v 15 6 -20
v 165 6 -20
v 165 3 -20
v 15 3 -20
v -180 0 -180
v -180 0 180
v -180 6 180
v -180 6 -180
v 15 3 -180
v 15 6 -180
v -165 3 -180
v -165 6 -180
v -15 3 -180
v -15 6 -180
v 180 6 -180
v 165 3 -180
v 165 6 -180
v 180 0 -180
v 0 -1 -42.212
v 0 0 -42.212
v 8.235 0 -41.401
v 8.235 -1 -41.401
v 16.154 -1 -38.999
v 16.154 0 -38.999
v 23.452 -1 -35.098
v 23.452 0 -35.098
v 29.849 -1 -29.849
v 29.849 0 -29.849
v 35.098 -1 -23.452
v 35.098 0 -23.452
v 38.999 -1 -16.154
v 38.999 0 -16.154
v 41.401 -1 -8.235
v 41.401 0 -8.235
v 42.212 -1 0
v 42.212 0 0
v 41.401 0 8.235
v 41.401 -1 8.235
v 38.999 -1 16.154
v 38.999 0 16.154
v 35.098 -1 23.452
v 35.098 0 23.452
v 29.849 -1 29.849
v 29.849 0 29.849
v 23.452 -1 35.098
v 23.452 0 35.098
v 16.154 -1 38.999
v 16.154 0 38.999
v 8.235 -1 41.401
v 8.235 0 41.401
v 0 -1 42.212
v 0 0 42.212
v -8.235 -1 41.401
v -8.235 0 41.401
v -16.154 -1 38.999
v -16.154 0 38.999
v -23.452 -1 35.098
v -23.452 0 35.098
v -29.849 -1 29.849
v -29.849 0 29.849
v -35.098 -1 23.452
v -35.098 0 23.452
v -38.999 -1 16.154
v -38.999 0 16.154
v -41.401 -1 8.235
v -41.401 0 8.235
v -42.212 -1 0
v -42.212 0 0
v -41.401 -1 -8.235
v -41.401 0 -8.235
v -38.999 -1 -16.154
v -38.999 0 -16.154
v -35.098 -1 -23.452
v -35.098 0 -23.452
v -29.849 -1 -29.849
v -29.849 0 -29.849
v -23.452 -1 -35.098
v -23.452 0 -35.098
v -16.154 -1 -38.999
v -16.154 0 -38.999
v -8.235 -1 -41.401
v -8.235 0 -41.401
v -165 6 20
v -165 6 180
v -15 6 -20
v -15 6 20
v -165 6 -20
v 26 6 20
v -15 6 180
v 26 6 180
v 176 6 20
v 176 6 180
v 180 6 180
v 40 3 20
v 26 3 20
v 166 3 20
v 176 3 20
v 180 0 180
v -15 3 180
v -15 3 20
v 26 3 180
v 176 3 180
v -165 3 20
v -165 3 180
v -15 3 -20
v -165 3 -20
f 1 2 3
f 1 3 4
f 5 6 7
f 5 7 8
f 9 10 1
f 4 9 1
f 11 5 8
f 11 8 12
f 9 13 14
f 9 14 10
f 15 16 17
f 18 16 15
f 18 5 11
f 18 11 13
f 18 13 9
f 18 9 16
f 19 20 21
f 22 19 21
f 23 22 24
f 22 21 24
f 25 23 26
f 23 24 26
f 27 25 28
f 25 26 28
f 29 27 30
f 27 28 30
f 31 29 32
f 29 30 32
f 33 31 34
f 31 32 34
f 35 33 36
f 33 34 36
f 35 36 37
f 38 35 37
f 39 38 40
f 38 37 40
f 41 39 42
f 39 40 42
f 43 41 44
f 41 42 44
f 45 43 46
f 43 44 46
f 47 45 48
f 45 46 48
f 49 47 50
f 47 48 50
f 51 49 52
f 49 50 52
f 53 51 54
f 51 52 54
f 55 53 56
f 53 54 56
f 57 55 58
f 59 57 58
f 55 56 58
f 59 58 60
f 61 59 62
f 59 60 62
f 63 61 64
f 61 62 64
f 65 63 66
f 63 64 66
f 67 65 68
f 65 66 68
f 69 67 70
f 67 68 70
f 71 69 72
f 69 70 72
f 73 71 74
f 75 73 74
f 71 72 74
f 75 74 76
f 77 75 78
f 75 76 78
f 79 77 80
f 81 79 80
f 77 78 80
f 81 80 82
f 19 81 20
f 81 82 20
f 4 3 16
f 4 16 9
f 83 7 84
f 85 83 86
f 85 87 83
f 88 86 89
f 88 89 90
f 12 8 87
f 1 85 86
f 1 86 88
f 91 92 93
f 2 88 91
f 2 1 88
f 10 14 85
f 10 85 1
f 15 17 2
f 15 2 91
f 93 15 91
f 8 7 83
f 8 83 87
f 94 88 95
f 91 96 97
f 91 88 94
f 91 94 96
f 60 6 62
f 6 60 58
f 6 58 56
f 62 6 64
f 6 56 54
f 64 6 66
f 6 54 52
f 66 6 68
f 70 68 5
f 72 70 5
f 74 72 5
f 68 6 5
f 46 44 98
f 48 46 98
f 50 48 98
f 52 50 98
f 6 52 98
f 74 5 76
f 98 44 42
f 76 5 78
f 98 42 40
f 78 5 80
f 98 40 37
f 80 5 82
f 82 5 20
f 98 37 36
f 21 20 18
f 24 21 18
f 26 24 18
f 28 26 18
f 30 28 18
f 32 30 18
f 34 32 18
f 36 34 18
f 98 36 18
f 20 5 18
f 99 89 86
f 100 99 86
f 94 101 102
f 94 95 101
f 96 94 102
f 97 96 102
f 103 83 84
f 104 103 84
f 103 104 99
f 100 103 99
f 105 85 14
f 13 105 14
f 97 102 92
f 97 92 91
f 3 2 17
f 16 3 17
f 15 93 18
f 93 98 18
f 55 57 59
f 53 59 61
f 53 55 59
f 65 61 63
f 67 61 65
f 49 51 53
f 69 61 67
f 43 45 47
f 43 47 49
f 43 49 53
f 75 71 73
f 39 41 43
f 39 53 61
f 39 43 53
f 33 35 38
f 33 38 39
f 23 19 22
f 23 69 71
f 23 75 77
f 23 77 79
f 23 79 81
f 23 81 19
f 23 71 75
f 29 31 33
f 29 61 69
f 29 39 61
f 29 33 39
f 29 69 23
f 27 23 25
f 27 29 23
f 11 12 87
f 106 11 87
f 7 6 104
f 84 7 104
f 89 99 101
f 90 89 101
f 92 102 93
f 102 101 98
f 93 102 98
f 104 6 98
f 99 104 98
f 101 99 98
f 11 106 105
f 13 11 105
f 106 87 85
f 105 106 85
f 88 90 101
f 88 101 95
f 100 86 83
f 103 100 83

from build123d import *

# Parameters (mm, degrees)
SKETCH_1_W          = 360
SKETCH_1_H          = 360
EXTRUDE_1_DEPTH     = 6
SKETCH_2_W          = 140
SKETCH_2_H          = 140
CUT_EXTRUDE_1_DEPTH = 3
SKETCH_7_W          = 140
SKETCH_7_H          = 169.149624319
CUT_EXTRUDE_2_DEPTH = 110
SKETCH_4_R          = 42.212172728
EXTRUDE_2_DEPTH     = 1
SKETCH_10_W         = 6
SKETCH_10_H         = 160
CUT_EXTRUDE_3_DEPTH = 3
SKETCH_11_W         = 6
SKETCH_11_H         = 160
EXTRUDE_3_DEPTH     = 3
SKETCH_12_W         = 14
SKETCH_12_H         = 160
CUT_EXTRUDE_4_DEPTH = 3
SKETCH_13_W         = 14
SKETCH_13_H         = 160
EXTRUDE_4_DEPTH     = 3
SKETCH_14_W         = 4
SKETCH_14_H         = 160
EXTRUDE_5_DEPTH     = 3
SKETCH_15_W         = 4
SKETCH_15_H         = 160
CUT_EXTRUDE_5_DEPTH = 3
CUT_EXTRUDE_6_DEPTH = 3
SKETCH_17_W         = 150
SKETCH_17_H         = 165.602098182
CUT_EXTRUDE_7_DEPTH = 3


with BuildPart() as part:
    # 草图1 → 凸台-拉伸1 (new body)
    with BuildSketch(Plane(origin=(0, 0, 0), x_dir=(1, 0, 0), z_dir=(0, 1, 0))):
        Rectangle(SKETCH_1_W, SKETCH_1_H)
    extrude(amount=EXTRUDE_1_DEPTH)

    # 草图2 → 切除-拉伸1 (cut)
    with BuildSketch(Plane(origin=(0, 6, 0), x_dir=(1, 0, 0), z_dir=(0, 1, 0))):
        with Locations((-90, -90)):
            Rectangle(SKETCH_2_W, SKETCH_2_H)
        with Locations((90, -90)):
            Rectangle(SKETCH_2_W, SKETCH_2_H)
        with Locations((90, 90)):
            Rectangle(SKETCH_2_W, SKETCH_2_H)
        with Locations((-90, 90)):
            Rectangle(SKETCH_2_W, SKETCH_2_H)
    extrude(amount=-CUT_EXTRUDE_1_DEPTH, mode=Mode.SUBTRACT)

    # 草图7 → 切除-拉伸2 (cut)
    with BuildSketch(Plane(origin=(0, 3, 0), x_dir=(1, 0, 0), z_dir=(0, 1, 0))):
        with Locations((90, -104.57481216)):
            Rectangle(SKETCH_7_W, SKETCH_7_H)
        with Locations((-90, -104.57481216)):
            Rectangle(SKETCH_7_W, SKETCH_7_H)
        with Locations((90, 104.57481216)):
            Rectangle(SKETCH_7_W, SKETCH_7_H)
        with Locations((-90, 104.57481216)):
            Rectangle(SKETCH_7_W, SKETCH_7_H)
    extrude(amount=CUT_EXTRUDE_2_DEPTH, mode=Mode.SUBTRACT)

    # 草图4 → 凸台-拉伸2 (add)
    with BuildSketch(Plane.XZ):
        with Locations(Location((0, 0, 0), (0, 0, 270))):
            Circle(SKETCH_4_R)
    extrude(amount=EXTRUDE_2_DEPTH)

    # 草图10 → 切除-拉伸3 (cut)
    with BuildSketch(Plane(origin=(0, 6, 0), x_dir=(1, 0, 0), z_dir=(0, 1, 0))):
        with Locations((163, -100)):
            Rectangle(SKETCH_10_W, SKETCH_10_H)
    extrude(amount=-CUT_EXTRUDE_3_DEPTH, mode=Mode.SUBTRACT)

    # 草图11 → 凸台-拉伸3 (add)
    with BuildSketch(Plane(origin=(0, 6, 0), x_dir=(1, 0, 0), z_dir=(0, 1, 0))):
        with Locations((23, -100)):
            Rectangle(SKETCH_11_W, SKETCH_11_H)
    extrude(amount=-EXTRUDE_3_DEPTH)

    # 草图12 → 切除-拉伸4 (cut)
    with BuildSketch(Plane(origin=(0, 6, 0), x_dir=(1, 0, 0), z_dir=(0, 1, 0))):
        with Locations((173, -100)):
            Rectangle(SKETCH_12_W, SKETCH_12_H)
    extrude(amount=-CUT_EXTRUDE_4_DEPTH, mode=Mode.SUBTRACT)

    # 草图13 → 凸台-拉伸4 (add)
    with BuildSketch(Plane(origin=(0, 3, 0), x_dir=(1, 0, 0), z_dir=(0, 1, 0))):
        with Locations((33, -100)):
            Rectangle(SKETCH_13_W, SKETCH_13_H)
    extrude(amount=EXTRUDE_4_DEPTH)

    # 草图14 → 凸台-拉伸5 (add)
    with BuildSketch(Plane(origin=(0, 3, 0), x_dir=(1, 0, 0), z_dir=(0, 1, 0))):
        with Locations((178, -100)):
            Rectangle(SKETCH_14_W, SKETCH_14_H)
    extrude(amount=EXTRUDE_5_DEPTH)

    # 草图15 → 切除-拉伸5 (cut)
    with BuildSketch(Plane(origin=(0, 6, 0), x_dir=(1, 0, 0), z_dir=(0, 1, 0))):
        with Locations((38, -100)):
            Rectangle(SKETCH_15_W, SKETCH_15_H)
    extrude(amount=-CUT_EXTRUDE_5_DEPTH, mode=Mode.SUBTRACT)

    # 草图16 → 切除-拉伸6 (cut)
    with BuildSketch(Plane(origin=(0, 6, 0), x_dir=(1, 0, 0), z_dir=(0, 1, 0))):
        Polygon((-15, -170), (-15, -20), (-165, -20), (-165, -170), (-165, -206.201346441), (-15, -206.201346441), align=None)
        Polygon((-165, 170), (-165, 20), (-15, 20), (-15, 170), (-15, 194.423731299), (-165, 194.423731299), align=None)
        Polygon((15, 170), (15, 194.423731299), (165, 194.423731299), (165, 170), (165, 20), (15, 20), align=None)
    extrude(amount=-CUT_EXTRUDE_6_DEPTH, mode=Mode.SUBTRACT)

    # 草图17 → 切除-拉伸7 (cut)
    with BuildSketch(Plane(origin=(0, 6, 0), x_dir=(1, 0, 0), z_dir=(0, 1, 0))):
        with Locations((101, -102.801049091)):
            Rectangle(SKETCH_17_W, SKETCH_17_H)
    extrude(amount=-CUT_EXTRUDE_7_DEPTH, mode=Mode.SUBTRACT)


solid = part.part
